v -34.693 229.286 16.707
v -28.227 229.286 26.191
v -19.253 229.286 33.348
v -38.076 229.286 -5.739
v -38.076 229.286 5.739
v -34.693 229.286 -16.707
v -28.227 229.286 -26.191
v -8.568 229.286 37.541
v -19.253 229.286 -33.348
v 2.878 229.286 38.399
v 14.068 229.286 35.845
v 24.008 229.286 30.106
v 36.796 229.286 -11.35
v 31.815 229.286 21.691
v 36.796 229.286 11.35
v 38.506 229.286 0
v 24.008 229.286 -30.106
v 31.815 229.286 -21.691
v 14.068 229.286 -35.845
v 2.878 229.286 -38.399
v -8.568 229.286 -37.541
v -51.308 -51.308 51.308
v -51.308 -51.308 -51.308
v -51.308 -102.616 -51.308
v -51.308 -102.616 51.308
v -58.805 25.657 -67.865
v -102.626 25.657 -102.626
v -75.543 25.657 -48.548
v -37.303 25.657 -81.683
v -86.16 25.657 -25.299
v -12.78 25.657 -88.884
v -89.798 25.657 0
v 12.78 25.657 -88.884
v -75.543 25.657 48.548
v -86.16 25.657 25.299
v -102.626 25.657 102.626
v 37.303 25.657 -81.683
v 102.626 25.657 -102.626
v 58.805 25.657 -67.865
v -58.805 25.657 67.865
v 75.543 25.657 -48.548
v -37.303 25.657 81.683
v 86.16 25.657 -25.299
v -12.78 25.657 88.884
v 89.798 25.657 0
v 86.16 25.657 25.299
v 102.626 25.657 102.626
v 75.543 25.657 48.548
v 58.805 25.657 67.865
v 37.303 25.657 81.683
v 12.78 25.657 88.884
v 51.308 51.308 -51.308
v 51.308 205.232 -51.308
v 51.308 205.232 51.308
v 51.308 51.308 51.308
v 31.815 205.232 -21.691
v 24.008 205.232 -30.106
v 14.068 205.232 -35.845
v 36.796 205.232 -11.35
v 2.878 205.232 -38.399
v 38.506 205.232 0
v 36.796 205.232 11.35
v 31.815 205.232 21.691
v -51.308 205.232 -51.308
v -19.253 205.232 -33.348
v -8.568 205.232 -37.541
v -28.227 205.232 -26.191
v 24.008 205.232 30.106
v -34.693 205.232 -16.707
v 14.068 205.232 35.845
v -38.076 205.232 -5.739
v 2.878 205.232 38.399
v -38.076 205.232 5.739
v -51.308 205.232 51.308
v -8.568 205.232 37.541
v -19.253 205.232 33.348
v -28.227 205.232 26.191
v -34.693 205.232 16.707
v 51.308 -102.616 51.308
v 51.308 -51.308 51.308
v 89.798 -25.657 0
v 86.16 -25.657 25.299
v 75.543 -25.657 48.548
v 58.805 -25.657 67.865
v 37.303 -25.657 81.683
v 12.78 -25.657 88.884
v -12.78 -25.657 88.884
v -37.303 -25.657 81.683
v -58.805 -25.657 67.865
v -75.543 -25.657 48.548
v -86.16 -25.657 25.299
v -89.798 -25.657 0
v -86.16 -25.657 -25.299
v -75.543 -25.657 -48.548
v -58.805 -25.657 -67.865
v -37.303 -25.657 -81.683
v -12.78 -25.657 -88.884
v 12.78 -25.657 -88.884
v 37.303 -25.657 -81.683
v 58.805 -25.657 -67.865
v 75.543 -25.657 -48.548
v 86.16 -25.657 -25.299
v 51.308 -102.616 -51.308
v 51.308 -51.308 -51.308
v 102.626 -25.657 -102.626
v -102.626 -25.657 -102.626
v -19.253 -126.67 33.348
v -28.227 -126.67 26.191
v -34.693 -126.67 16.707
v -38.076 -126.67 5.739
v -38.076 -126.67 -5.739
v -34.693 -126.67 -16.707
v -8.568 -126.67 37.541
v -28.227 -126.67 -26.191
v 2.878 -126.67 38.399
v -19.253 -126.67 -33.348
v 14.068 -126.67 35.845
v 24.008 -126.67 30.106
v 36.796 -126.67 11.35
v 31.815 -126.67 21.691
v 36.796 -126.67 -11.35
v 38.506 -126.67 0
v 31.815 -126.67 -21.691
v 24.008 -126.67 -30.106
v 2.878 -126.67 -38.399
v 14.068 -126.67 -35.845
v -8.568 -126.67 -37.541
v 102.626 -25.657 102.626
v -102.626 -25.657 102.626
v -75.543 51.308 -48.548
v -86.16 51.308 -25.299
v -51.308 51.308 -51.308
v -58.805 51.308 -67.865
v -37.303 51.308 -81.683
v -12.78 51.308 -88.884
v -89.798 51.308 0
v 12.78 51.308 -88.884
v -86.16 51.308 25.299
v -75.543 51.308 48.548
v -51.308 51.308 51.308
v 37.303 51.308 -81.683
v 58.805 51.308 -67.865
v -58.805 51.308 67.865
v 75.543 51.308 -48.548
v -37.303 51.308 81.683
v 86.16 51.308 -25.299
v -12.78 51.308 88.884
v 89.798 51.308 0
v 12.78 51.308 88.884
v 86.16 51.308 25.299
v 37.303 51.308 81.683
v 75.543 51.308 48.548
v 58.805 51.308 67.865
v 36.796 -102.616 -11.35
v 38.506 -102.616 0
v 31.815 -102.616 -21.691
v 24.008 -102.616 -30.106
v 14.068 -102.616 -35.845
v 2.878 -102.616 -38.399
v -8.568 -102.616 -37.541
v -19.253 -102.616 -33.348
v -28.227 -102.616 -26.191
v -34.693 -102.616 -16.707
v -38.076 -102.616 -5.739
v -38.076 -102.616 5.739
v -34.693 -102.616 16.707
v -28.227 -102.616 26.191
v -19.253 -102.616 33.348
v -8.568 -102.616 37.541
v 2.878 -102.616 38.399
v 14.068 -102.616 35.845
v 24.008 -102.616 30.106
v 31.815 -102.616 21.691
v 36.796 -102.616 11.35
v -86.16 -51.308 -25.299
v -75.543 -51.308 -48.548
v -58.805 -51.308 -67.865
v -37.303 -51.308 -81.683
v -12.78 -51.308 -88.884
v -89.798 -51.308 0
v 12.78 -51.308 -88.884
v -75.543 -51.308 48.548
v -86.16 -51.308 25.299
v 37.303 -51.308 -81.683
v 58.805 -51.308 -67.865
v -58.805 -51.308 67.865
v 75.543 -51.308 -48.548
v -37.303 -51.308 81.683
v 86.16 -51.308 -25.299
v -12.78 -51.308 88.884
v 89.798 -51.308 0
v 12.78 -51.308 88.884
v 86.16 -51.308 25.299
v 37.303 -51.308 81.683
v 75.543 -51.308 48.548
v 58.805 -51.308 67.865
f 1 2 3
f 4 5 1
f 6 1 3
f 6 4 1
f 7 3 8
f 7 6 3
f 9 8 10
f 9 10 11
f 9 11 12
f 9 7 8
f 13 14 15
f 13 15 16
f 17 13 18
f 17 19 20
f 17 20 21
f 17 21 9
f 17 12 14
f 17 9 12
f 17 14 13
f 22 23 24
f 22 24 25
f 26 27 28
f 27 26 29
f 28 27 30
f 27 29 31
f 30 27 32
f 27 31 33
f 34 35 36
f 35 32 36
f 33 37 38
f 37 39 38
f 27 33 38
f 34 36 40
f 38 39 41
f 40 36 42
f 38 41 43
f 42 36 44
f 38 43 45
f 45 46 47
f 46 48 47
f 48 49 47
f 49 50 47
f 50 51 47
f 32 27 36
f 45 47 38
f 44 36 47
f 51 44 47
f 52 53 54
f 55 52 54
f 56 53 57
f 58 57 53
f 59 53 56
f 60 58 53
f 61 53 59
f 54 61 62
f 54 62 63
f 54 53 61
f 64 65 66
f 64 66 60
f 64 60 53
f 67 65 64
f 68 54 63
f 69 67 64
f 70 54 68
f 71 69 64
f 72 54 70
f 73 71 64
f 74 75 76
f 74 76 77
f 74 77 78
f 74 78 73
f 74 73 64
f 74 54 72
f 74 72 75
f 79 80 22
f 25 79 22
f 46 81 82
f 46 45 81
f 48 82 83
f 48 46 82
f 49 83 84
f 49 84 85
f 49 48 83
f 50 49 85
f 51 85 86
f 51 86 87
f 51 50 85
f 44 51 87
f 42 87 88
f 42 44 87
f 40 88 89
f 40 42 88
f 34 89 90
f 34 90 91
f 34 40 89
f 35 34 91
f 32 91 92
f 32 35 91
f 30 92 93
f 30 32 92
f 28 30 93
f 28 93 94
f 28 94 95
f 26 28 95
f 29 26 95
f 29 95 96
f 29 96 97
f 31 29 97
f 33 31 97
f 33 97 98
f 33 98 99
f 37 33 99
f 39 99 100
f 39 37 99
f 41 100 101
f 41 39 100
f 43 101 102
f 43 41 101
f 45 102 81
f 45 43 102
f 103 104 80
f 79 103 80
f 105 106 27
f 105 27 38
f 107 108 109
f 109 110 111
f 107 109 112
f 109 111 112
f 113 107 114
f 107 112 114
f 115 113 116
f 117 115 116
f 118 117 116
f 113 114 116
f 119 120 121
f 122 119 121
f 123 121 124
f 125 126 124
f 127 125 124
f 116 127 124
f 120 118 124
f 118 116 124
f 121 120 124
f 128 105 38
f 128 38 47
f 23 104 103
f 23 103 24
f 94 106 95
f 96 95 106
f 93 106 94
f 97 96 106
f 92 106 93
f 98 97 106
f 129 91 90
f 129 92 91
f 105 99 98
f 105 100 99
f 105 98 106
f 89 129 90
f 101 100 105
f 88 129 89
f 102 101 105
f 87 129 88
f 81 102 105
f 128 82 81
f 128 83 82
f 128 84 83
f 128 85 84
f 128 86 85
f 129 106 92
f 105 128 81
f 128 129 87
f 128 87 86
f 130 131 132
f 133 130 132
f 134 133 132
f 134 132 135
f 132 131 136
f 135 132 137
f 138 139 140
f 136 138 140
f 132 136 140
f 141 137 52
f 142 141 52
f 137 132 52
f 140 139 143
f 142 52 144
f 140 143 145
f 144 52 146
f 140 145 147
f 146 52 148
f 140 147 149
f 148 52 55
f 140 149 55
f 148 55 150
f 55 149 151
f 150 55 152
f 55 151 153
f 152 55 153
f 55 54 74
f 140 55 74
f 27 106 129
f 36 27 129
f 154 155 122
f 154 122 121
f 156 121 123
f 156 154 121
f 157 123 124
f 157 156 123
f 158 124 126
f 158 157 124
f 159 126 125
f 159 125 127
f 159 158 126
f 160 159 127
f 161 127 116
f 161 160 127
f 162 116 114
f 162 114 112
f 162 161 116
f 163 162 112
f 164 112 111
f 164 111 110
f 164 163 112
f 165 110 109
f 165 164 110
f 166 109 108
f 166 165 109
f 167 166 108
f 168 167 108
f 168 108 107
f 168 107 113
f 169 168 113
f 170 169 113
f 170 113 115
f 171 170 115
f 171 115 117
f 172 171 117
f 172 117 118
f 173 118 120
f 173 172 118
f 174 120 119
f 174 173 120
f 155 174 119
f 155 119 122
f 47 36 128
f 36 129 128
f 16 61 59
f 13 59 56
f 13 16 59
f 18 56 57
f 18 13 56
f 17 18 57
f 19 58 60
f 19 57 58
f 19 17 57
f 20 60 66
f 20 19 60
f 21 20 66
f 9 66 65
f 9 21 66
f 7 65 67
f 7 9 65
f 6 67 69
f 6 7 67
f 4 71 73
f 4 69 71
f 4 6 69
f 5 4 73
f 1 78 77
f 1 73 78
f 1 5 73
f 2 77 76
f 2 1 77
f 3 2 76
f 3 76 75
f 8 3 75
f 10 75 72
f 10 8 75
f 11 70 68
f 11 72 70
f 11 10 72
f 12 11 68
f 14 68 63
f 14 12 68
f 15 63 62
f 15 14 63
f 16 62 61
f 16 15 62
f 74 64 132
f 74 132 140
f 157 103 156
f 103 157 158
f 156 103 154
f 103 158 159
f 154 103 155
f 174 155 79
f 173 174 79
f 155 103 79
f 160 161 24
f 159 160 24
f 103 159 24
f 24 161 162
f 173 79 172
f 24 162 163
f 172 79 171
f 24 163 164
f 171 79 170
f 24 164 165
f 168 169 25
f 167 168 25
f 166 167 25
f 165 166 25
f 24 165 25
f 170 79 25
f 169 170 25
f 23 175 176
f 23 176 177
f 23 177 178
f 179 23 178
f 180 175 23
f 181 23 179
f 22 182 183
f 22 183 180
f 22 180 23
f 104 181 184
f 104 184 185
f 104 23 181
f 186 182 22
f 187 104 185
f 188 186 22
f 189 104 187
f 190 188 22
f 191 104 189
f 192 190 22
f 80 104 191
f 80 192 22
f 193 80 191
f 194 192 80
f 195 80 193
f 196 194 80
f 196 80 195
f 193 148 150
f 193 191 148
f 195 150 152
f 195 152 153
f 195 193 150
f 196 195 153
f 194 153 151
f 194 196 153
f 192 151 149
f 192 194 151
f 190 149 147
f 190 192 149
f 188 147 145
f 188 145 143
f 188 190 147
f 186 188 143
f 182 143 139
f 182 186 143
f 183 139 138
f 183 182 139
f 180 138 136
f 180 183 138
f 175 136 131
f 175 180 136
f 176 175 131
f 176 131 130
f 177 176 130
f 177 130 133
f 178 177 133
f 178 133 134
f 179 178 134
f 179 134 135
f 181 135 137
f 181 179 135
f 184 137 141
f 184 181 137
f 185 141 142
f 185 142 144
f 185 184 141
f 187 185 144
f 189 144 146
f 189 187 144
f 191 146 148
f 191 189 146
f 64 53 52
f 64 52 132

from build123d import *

# Parameters (mm, degrees)
F0_W      = 205.25232
F0_H      = 205.25232
F0_R      = 89.79789
F1_DEPTH  = 25.65654
F2_DEPTH  = 51.308
F3_W      = 102.616
F3_H      = 102.616
F3_R      = 38.5064
F4_DEPTH  = 153.924
F4_FACE_R = 38.5064
F5_DEPTH  = 177.9778


with BuildPart() as f1:
    # F0 (on Front) → F1 (new body, symmetric)
    with BuildSketch(Plane.XZ):
        Rectangle(F0_W, F0_H)
        Circle(F0_R, mode=Mode.SUBTRACT)
    extrude(amount=F1_DEPTH, both=True)


with BuildPart() as f2:
    # F0 (on Front) → F2 (new body, symmetric)
    with BuildSketch(Plane.XZ):
        Circle(F0_R)
    extrude(amount=F2_DEPTH, both=True)

    # F3 (on face) → F4 (join, symmetric)
    with BuildSketch(Plane(origin=(0, 51.308, 0), x_dir=(-1, 0, 0), z_dir=(0, 1, 0))):
        Rectangle(F3_W, F3_H)
        Circle(F3_R, mode=Mode.SUBTRACT)
    extrude(amount=F4_DEPTH, both=True)

    # F4_face (on face) → F5 (join, symmetric)
    with BuildSketch(Plane(origin=(0, 51.308, 0), x_dir=(1, 0, 0), z_dir=(0, 1, 0))):
        Circle(F4_FACE_R)
    extrude(amount=F5_DEPTH, both=True)


solid = Compound([f1.part, f2.part])
